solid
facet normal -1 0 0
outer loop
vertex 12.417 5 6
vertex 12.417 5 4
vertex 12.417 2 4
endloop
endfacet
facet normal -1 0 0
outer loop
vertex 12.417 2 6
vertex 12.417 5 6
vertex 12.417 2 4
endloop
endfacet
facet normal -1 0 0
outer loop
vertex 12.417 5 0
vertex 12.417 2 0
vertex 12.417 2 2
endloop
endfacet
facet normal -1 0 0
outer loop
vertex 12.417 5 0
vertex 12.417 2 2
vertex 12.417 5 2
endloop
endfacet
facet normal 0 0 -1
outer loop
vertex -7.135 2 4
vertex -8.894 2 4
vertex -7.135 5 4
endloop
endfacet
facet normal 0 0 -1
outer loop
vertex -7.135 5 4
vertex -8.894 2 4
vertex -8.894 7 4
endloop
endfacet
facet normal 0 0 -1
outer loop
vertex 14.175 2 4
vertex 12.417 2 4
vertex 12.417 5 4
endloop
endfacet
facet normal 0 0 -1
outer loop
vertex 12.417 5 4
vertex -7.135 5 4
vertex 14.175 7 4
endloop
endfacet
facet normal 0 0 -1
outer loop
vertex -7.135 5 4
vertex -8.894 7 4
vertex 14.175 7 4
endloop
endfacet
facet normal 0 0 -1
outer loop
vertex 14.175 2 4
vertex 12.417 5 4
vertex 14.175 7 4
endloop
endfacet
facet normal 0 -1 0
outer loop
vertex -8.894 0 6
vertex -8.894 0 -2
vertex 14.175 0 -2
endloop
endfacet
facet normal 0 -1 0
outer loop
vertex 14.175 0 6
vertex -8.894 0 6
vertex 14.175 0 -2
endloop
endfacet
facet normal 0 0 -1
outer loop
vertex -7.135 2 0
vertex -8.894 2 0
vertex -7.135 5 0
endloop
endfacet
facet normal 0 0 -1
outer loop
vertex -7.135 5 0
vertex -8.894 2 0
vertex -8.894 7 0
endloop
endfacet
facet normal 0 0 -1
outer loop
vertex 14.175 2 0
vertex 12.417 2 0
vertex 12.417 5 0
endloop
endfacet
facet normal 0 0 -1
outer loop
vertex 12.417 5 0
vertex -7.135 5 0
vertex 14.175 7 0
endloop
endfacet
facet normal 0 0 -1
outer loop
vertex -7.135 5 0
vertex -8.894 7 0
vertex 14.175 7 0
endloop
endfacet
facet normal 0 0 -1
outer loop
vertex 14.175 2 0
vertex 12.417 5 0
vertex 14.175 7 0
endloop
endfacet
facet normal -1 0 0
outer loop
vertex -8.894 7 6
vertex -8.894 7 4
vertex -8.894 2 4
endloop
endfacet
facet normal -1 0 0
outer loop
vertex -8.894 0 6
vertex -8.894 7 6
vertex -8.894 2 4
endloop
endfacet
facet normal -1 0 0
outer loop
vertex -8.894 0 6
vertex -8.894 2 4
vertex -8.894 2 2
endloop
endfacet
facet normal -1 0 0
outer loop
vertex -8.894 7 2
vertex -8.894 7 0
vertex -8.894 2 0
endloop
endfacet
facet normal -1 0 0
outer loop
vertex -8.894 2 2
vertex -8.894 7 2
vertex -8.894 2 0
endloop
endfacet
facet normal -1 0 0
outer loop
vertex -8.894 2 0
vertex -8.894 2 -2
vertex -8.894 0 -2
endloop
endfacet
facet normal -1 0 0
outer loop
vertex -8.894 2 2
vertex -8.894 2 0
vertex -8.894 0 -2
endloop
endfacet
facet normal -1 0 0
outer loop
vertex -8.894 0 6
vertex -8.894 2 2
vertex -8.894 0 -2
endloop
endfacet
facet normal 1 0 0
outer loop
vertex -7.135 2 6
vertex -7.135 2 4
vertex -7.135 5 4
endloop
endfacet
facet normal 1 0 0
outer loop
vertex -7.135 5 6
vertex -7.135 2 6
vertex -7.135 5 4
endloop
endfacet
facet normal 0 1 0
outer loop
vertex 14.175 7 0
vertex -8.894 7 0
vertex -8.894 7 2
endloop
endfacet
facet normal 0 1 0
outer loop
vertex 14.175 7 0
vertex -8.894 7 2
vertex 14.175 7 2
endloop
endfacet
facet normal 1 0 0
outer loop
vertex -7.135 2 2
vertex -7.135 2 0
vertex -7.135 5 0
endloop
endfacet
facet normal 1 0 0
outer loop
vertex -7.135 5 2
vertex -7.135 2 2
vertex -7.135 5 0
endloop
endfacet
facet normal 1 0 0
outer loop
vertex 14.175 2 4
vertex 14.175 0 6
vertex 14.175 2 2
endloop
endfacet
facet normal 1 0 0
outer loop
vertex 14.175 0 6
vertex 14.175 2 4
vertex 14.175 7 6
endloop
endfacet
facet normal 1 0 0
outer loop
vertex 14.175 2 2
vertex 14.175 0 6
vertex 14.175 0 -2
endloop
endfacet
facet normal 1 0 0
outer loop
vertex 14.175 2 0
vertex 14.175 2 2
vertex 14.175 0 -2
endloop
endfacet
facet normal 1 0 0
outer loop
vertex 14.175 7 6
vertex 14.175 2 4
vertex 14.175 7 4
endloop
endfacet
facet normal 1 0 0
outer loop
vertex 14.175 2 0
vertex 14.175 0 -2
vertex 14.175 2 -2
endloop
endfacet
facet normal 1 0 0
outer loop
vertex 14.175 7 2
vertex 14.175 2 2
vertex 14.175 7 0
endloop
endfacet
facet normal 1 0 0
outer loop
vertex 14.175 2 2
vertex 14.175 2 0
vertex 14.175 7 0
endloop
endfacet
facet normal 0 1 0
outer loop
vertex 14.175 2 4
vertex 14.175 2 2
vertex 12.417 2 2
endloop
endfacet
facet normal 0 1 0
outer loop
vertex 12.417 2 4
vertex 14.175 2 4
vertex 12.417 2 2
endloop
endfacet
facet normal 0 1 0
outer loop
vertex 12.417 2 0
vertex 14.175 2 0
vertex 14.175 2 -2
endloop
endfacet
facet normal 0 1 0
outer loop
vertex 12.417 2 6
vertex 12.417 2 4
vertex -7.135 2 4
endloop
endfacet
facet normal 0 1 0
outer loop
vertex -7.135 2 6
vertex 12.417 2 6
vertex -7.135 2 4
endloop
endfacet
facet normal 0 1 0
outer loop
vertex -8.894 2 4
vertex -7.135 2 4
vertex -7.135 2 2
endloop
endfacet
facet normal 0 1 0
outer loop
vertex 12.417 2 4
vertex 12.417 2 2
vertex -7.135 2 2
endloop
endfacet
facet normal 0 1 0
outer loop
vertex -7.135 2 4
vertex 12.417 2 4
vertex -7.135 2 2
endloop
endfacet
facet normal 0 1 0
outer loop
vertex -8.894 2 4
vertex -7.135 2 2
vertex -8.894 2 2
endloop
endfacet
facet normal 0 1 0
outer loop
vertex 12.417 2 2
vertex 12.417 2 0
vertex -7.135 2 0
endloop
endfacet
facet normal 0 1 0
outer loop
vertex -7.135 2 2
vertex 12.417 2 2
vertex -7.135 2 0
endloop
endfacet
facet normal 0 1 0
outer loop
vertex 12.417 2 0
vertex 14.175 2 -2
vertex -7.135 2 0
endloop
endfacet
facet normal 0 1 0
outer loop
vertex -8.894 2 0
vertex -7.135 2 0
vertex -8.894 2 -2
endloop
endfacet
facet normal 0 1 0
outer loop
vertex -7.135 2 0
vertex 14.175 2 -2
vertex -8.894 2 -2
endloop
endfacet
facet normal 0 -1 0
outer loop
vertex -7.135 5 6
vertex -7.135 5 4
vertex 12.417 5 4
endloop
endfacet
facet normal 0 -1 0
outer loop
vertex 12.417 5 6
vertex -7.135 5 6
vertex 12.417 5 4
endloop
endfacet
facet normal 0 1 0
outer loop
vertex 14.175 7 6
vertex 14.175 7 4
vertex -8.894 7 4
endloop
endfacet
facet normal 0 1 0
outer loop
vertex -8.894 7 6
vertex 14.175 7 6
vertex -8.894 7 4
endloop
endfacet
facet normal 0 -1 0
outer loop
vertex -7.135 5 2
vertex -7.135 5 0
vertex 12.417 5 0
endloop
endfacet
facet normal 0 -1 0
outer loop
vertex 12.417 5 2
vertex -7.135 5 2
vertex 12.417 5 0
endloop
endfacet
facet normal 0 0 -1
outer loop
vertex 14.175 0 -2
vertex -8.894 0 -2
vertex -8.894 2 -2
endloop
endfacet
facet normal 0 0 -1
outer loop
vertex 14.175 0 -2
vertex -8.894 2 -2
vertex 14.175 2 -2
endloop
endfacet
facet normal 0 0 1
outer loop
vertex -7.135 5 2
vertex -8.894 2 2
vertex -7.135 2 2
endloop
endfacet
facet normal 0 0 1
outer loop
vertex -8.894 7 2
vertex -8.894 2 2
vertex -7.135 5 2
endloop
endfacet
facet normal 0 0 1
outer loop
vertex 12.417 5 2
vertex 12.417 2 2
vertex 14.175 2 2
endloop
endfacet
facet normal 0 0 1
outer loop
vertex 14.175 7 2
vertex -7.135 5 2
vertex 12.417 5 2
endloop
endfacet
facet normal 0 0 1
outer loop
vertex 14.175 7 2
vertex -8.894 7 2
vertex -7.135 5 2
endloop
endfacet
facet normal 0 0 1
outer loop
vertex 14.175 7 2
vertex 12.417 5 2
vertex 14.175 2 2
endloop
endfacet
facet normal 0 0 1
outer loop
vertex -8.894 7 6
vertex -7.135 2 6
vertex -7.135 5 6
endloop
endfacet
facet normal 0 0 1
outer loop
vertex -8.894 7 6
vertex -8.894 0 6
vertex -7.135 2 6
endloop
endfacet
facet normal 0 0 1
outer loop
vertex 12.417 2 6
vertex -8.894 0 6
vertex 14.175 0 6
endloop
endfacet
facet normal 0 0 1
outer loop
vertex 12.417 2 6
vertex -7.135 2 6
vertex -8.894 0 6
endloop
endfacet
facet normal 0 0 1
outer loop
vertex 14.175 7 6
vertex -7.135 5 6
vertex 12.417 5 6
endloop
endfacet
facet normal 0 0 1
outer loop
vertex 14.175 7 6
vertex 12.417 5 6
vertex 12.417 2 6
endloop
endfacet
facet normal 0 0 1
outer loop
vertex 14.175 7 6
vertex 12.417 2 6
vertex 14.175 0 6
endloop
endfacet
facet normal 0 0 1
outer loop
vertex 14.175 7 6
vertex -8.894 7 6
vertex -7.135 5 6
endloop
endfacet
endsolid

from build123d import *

# Parameters (mm, degrees)
F0_W     = 23.068964
F0_H     = 7
F0_W_2   = 19.551722
F0_H_2   = 3
F1_DEPTH = 2
F3_DEPTH = 2
F5_DEPTH = 2
F7_DEPTH = 2


with BuildPart() as f1:
    # F0 (on Top) → F1 (new body)
    with BuildSketch(Plane.XY):
        with Locations((2.640947, 3.5)):
            Rectangle(F0_W, F0_H)
        with Locations((2.640947, 3.5)):
            Rectangle(F0_W_2, F0_H_2, mode=Mode.SUBTRACT)
    extrude(amount=F1_DEPTH)

    # F2 (on face) → F3 (join)
    with BuildSketch(Plane(origin=(0, 0, 0), x_dir=(1, 0, 0), z_dir=(0, 0, -1))):
        Polygon((14.175429, -2), (14.175429, 0), (-8.893535, 0), (-8.893535, -2), (-7.134914, -2), (12.416808, -2), align=None)
    extrude(amount=F3_DEPTH)

    # F4 (on face) → F5 (join)
    with BuildSketch(Plane.XY.offset(2)):
        Polygon((-8.893535, 2), (-8.893535, 0), (14.175429, 0), (14.175429, 2), (12.416808, 2), (-7.134914, 2), align=None)
    extrude(amount=F5_DEPTH)

    # F6 (on face) → F7 (join)
    with BuildSketch(Plane.XY.offset(4)):
        Polygon((-7.134914, 2), (-8.893535, 2), (-8.893535, 0), (14.175429, 0), (14.175429, 2), (12.416808, 2), align=None)
        Polygon((-8.893535, 7), (-8.893535, 2), (-7.134914, 2), (-7.134914, 5), (12.416808, 5), (12.416808, 2), (14.175429, 2), (14.175429, 7), align=None)
    extrude(amount=F7_DEPTH)


solid = f1.part
